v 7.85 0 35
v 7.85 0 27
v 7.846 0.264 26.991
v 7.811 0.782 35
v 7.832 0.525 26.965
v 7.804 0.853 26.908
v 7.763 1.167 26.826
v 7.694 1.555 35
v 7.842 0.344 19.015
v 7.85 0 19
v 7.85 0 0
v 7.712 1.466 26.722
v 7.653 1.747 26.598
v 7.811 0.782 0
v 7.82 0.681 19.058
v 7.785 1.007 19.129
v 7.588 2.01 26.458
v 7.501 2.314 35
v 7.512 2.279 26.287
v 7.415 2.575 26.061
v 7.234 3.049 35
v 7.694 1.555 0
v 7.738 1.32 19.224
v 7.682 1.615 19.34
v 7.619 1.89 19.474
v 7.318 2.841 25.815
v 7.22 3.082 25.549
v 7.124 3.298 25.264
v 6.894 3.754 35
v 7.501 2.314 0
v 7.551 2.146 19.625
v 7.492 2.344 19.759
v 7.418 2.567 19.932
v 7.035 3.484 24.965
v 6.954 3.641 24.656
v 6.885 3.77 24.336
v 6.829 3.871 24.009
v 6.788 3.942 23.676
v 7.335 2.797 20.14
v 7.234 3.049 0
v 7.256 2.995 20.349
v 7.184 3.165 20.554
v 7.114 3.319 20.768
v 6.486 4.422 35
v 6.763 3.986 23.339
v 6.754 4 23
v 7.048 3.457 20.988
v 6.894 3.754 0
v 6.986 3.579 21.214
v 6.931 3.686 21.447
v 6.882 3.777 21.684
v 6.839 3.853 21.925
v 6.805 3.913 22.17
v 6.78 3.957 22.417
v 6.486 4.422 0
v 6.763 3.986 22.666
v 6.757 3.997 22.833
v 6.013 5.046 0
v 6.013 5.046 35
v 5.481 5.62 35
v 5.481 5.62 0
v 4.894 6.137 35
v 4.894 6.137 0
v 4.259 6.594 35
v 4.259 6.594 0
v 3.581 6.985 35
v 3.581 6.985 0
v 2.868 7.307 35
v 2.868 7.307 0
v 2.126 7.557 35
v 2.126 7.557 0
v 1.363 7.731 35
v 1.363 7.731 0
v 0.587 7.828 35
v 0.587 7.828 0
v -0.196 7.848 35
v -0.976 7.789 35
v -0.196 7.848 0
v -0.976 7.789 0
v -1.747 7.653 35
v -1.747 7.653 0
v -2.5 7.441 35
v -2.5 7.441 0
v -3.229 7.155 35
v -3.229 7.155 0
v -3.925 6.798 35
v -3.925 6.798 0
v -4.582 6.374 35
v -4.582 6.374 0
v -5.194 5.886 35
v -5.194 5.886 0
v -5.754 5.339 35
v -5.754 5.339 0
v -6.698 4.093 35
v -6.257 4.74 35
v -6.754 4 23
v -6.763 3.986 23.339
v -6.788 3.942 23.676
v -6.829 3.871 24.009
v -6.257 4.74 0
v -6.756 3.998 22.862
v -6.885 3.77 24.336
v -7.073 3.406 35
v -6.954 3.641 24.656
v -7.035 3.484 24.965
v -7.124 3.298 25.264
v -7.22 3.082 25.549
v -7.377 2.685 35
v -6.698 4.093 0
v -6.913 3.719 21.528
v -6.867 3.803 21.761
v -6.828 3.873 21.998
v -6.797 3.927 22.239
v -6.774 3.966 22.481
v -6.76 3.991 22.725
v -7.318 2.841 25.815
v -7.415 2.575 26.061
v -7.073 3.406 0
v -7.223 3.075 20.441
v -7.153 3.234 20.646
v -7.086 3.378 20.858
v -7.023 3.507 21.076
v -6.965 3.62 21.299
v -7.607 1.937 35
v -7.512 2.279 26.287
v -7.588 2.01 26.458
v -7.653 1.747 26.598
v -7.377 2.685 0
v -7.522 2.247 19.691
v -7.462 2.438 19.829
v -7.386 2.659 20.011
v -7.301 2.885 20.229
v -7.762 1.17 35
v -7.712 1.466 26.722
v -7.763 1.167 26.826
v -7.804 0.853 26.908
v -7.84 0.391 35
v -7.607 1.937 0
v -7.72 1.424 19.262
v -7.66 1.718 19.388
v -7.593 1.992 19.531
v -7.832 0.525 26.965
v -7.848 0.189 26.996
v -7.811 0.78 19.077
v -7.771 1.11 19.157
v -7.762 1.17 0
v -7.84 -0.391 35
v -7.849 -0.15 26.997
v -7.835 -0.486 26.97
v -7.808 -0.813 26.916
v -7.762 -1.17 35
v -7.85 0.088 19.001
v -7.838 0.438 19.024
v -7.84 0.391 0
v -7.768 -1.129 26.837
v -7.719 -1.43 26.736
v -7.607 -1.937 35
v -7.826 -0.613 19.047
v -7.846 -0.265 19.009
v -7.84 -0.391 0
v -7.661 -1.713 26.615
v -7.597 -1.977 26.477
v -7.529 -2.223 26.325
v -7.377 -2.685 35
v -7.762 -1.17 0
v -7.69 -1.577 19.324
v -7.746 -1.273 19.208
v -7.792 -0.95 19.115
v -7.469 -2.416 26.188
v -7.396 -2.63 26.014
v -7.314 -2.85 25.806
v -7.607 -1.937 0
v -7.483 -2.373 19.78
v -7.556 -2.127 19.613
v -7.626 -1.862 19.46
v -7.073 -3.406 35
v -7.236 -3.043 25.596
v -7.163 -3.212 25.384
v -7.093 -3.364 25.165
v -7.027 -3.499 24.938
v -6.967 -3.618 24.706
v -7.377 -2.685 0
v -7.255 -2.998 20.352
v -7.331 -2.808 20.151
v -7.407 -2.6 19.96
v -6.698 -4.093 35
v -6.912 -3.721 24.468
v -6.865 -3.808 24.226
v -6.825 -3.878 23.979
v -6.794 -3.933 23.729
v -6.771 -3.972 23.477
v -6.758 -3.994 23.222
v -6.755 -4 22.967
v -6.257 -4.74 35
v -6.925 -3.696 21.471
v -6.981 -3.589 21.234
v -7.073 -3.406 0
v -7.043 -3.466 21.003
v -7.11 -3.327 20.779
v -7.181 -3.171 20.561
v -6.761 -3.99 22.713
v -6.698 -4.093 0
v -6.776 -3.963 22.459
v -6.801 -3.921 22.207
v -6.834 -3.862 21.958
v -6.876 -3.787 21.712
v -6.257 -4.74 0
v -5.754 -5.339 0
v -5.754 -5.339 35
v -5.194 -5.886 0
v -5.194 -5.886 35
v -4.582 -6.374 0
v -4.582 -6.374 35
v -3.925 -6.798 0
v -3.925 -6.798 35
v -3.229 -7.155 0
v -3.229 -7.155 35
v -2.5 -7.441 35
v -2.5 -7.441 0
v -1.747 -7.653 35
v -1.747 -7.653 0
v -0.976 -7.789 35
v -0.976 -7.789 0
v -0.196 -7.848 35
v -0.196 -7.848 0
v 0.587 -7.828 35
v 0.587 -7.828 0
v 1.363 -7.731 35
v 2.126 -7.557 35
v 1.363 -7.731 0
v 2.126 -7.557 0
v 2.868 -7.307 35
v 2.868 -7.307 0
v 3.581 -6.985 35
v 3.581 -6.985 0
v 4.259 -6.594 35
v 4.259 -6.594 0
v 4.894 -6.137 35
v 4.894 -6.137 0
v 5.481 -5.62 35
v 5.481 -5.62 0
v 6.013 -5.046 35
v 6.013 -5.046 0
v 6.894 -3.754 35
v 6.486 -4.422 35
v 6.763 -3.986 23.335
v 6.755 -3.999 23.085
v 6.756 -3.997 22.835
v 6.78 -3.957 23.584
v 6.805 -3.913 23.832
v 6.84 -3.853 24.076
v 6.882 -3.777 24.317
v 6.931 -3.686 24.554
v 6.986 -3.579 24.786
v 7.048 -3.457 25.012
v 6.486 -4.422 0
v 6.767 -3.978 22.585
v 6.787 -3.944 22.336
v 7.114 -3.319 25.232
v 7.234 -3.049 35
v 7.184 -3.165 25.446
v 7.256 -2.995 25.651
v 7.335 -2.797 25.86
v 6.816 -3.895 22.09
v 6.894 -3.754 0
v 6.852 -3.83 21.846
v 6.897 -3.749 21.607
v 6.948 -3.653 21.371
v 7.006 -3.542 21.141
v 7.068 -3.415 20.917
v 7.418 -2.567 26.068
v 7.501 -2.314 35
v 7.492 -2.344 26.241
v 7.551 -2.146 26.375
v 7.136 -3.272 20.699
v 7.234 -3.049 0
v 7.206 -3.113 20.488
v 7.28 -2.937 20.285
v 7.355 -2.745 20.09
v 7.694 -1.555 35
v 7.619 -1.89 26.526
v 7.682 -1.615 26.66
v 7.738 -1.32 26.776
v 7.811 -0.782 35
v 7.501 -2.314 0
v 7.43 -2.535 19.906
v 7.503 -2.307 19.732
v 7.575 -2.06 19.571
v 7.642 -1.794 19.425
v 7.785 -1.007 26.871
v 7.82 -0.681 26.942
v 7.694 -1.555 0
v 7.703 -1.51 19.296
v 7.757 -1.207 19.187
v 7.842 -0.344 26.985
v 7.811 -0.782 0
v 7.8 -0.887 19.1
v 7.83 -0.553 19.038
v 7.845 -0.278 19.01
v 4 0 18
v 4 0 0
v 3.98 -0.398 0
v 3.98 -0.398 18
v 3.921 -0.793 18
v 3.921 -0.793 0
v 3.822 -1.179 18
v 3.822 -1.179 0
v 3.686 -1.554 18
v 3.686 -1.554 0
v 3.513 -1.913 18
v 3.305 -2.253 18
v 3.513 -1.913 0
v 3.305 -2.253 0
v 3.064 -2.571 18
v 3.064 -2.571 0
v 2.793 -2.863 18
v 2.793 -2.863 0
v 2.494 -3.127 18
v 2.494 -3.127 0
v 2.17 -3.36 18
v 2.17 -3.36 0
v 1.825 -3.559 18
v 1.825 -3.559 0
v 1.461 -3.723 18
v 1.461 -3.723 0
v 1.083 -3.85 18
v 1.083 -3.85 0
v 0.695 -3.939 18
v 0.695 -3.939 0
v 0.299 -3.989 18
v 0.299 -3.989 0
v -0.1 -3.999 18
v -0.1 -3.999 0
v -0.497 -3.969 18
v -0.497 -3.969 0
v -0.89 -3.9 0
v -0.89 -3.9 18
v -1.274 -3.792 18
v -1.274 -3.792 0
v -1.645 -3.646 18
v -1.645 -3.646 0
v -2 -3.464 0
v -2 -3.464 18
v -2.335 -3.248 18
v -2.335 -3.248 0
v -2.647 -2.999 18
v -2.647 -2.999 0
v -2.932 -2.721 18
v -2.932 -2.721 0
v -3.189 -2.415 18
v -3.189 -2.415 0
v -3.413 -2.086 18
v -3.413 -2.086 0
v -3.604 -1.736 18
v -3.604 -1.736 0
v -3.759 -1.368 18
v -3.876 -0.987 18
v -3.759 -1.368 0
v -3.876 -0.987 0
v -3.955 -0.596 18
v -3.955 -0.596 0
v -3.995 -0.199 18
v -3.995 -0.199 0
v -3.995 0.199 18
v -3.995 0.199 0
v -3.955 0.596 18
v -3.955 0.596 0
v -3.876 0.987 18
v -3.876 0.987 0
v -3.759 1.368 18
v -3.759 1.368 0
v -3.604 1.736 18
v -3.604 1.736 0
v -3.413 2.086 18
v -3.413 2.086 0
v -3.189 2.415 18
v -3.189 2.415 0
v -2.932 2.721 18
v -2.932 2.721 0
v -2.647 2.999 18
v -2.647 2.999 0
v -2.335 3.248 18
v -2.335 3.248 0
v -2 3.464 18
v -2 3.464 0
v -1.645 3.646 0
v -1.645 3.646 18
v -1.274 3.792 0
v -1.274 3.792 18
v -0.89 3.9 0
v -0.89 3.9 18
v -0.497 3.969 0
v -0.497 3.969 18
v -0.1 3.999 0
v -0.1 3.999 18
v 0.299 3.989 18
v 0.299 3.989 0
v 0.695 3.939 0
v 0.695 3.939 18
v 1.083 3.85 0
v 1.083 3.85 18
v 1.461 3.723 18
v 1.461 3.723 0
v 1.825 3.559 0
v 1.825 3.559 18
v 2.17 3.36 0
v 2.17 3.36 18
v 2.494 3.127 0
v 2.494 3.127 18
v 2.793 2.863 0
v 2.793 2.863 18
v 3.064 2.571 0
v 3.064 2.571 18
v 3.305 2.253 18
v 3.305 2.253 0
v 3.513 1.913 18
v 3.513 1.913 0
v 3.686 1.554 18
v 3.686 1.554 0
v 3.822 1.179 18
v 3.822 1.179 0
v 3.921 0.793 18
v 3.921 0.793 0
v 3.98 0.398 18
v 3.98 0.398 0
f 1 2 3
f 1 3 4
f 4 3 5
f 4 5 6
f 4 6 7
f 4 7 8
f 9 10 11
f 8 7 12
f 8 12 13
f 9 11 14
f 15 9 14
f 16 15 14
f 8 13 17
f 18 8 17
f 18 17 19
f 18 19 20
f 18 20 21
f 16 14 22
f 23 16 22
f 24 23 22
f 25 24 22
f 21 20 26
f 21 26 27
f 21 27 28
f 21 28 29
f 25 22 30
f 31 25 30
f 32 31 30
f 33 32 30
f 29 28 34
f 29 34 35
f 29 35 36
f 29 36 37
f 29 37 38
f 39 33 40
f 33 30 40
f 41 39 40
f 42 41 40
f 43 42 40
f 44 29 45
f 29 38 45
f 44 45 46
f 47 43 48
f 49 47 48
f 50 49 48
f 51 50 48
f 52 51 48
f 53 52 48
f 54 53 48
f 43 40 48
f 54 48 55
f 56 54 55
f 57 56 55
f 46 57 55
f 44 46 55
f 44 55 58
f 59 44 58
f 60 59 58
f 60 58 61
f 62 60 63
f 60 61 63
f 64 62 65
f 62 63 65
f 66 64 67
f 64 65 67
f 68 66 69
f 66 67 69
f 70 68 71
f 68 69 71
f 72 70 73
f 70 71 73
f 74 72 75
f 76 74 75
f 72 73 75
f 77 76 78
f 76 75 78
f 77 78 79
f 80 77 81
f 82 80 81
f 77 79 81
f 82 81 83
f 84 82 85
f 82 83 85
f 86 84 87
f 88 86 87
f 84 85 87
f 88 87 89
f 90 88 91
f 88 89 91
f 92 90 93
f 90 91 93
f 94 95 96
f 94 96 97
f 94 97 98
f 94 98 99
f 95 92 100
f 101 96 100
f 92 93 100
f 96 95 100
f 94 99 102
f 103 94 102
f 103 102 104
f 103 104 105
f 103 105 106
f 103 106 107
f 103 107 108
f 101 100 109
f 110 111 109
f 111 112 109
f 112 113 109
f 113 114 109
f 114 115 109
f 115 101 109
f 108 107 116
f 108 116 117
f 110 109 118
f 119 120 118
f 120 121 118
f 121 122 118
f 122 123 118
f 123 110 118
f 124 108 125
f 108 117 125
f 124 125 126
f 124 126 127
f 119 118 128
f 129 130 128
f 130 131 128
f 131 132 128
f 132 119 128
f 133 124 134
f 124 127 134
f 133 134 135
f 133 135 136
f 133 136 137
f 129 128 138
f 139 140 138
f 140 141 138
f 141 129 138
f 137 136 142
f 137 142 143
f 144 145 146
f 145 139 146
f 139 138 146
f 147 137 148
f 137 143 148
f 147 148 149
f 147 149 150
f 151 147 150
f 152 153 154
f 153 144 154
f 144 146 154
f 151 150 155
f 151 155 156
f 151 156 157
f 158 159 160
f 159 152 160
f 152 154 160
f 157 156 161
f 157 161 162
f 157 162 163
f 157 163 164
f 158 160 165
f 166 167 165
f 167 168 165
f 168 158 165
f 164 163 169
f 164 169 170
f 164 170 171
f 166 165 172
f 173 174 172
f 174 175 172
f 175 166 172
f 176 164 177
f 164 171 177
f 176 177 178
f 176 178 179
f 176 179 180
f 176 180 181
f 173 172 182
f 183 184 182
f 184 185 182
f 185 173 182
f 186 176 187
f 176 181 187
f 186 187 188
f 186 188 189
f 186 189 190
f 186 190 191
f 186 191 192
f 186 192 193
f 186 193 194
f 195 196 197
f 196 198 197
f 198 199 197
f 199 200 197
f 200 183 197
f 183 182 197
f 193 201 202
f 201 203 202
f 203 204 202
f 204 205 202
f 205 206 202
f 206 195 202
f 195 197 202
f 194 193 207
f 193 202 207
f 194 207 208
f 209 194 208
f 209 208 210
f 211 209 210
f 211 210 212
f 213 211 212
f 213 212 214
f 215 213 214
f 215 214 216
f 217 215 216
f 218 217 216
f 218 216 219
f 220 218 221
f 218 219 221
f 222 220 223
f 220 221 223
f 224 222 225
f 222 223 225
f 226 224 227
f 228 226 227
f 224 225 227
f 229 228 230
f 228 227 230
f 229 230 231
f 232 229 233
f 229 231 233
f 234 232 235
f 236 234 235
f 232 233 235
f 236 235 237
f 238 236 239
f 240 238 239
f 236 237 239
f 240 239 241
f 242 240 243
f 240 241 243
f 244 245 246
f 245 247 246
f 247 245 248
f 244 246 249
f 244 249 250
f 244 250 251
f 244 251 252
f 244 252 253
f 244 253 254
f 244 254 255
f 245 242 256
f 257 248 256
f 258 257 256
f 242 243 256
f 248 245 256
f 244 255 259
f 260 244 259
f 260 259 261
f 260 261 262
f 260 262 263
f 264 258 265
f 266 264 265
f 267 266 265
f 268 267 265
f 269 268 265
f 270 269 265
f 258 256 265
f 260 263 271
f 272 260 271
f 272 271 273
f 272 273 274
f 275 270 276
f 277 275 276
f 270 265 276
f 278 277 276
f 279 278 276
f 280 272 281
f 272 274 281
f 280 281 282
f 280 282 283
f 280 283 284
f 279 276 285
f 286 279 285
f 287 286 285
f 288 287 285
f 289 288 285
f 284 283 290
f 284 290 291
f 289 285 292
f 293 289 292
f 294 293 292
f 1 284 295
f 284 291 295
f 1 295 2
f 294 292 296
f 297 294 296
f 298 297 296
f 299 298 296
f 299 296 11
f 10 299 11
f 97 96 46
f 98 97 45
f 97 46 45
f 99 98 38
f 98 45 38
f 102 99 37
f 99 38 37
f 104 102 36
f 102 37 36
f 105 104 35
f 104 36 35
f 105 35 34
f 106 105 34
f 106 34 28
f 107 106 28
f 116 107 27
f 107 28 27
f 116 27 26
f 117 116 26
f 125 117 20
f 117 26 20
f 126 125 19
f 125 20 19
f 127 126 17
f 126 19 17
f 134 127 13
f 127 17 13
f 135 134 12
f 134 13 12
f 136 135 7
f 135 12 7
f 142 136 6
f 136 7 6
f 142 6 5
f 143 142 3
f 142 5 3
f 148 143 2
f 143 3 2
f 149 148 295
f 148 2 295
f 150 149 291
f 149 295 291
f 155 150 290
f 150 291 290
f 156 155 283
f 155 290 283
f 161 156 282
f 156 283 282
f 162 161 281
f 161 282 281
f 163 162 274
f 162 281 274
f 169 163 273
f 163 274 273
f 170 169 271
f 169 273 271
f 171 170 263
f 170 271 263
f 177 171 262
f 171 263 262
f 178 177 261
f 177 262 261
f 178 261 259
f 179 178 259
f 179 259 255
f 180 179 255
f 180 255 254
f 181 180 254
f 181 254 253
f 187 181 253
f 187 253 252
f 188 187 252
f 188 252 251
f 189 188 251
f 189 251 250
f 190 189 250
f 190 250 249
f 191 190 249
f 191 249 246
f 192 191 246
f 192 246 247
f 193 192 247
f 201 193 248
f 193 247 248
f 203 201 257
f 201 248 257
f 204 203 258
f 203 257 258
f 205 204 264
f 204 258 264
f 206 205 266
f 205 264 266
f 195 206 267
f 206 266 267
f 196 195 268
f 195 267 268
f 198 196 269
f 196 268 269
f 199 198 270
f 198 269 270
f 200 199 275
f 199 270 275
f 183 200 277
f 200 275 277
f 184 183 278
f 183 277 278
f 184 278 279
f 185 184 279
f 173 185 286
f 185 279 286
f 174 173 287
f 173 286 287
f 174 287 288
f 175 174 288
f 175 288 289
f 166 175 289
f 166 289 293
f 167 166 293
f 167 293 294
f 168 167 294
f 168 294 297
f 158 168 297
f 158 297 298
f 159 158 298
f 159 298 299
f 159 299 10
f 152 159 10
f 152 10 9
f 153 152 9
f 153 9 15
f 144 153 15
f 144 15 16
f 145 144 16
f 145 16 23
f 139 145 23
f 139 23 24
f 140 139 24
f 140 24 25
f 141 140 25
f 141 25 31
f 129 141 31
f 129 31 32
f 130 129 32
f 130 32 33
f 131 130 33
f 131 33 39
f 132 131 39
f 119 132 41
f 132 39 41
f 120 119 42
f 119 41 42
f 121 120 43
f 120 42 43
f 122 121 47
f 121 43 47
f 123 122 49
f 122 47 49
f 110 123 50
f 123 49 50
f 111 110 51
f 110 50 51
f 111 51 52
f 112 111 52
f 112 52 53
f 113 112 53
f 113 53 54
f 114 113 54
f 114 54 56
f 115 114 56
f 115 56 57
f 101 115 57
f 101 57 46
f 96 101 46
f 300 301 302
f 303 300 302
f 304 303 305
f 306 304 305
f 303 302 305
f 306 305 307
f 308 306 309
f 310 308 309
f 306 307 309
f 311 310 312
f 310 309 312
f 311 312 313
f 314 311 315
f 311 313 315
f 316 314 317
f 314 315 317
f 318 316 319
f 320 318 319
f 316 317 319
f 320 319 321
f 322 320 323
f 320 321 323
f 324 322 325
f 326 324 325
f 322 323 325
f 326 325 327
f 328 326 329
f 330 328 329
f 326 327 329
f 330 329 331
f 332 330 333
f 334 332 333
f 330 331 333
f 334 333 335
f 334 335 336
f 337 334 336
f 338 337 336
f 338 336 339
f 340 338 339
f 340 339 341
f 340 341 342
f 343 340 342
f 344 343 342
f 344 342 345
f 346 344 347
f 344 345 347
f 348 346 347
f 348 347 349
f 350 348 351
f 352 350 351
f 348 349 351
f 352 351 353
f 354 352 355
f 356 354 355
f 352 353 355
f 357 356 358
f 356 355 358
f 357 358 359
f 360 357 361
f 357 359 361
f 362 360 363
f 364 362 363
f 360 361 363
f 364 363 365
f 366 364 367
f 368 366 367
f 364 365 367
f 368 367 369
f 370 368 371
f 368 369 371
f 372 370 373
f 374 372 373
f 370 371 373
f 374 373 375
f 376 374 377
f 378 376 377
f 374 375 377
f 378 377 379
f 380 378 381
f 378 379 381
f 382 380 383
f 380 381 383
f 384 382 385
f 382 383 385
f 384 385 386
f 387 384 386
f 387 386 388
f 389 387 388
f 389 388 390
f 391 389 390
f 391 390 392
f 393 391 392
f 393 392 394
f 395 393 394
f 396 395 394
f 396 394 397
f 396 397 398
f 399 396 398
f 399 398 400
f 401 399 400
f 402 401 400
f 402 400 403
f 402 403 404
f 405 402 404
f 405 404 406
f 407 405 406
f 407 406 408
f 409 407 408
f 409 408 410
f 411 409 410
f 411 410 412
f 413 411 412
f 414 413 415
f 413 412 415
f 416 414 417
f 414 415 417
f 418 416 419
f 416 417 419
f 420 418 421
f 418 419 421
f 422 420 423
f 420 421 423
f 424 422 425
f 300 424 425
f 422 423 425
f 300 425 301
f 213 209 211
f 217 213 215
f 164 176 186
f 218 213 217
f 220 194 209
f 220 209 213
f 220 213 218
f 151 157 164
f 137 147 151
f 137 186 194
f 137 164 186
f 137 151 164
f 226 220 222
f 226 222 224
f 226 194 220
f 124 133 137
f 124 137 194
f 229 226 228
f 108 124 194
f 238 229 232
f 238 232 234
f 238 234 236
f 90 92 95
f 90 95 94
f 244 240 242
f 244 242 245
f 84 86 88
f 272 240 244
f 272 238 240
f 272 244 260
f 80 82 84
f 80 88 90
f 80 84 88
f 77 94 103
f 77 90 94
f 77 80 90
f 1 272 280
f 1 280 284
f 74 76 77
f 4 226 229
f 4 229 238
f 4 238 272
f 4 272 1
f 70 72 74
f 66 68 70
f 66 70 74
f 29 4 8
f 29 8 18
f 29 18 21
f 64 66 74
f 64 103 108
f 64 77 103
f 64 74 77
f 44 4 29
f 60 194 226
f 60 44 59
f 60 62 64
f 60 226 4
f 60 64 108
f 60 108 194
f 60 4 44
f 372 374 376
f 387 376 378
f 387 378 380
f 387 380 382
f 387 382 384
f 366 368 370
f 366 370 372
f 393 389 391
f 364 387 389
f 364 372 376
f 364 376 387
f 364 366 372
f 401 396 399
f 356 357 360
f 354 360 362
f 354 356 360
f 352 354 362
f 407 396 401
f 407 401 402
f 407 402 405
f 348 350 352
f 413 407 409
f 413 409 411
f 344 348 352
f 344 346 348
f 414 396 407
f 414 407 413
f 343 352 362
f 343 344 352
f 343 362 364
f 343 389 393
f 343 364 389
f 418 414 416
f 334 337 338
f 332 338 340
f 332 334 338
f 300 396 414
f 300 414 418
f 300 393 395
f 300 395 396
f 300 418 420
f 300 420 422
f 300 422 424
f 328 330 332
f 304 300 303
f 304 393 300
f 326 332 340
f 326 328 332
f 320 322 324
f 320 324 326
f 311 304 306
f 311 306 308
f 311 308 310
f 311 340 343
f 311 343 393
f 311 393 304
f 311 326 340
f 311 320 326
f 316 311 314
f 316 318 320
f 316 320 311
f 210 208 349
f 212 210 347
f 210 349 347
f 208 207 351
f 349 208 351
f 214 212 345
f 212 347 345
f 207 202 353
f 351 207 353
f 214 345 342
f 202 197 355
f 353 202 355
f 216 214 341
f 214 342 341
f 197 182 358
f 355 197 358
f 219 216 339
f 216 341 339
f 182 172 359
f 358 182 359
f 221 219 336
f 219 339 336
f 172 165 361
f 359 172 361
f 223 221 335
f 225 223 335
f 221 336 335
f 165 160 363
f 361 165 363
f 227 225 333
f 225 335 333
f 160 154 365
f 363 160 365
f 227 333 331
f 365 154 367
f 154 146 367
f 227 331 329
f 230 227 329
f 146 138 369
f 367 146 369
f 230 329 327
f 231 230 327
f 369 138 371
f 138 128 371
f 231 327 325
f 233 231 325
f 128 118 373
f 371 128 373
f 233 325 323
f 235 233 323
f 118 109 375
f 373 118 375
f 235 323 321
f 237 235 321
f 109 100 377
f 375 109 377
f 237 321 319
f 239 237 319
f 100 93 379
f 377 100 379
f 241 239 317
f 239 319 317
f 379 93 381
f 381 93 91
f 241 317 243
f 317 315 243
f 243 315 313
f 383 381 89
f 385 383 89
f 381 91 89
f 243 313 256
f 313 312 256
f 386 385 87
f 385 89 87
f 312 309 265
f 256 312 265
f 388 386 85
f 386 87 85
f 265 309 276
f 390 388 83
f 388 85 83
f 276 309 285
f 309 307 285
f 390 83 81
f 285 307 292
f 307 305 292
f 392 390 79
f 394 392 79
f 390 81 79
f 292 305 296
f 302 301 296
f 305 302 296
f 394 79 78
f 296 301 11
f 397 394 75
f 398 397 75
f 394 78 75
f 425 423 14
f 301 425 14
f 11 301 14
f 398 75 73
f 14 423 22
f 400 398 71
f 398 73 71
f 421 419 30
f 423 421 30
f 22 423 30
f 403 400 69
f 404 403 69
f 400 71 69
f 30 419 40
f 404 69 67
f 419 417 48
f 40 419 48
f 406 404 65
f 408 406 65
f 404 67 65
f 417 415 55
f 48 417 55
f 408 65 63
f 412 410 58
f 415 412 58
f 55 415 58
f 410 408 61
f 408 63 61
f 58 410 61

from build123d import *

# Parameters (mm, degrees)
F0_R     = 7.85
F1_DEPTH = 35
F2_R     = 4
F3_DEPTH = 12.5
F4_R     = 4
F5_DEPTH = 18


with BuildPart() as f1:
    # F0 (on Top) → F1 (new body)
    with BuildSketch(Plane.XY):
        Circle(F0_R)
    extrude(amount=F1_DEPTH)

    # F2 (on Right) → F3 (cut, symmetric)
    with BuildSketch(Plane.YZ):
        with Locations((0, 23)):
            Circle(F2_R)
    extrude(amount=F3_DEPTH, both=True, mode=Mode.SUBTRACT)

    # F4 (on face) → F5 (cut)
    with BuildSketch(Plane(origin=(0, 0, 0), x_dir=(1, 0, 0), z_dir=(0, 0, -1))):
        Circle(F4_R)
    extrude(amount=-F5_DEPTH, mode=Mode.SUBTRACT)


solid = f1.part
